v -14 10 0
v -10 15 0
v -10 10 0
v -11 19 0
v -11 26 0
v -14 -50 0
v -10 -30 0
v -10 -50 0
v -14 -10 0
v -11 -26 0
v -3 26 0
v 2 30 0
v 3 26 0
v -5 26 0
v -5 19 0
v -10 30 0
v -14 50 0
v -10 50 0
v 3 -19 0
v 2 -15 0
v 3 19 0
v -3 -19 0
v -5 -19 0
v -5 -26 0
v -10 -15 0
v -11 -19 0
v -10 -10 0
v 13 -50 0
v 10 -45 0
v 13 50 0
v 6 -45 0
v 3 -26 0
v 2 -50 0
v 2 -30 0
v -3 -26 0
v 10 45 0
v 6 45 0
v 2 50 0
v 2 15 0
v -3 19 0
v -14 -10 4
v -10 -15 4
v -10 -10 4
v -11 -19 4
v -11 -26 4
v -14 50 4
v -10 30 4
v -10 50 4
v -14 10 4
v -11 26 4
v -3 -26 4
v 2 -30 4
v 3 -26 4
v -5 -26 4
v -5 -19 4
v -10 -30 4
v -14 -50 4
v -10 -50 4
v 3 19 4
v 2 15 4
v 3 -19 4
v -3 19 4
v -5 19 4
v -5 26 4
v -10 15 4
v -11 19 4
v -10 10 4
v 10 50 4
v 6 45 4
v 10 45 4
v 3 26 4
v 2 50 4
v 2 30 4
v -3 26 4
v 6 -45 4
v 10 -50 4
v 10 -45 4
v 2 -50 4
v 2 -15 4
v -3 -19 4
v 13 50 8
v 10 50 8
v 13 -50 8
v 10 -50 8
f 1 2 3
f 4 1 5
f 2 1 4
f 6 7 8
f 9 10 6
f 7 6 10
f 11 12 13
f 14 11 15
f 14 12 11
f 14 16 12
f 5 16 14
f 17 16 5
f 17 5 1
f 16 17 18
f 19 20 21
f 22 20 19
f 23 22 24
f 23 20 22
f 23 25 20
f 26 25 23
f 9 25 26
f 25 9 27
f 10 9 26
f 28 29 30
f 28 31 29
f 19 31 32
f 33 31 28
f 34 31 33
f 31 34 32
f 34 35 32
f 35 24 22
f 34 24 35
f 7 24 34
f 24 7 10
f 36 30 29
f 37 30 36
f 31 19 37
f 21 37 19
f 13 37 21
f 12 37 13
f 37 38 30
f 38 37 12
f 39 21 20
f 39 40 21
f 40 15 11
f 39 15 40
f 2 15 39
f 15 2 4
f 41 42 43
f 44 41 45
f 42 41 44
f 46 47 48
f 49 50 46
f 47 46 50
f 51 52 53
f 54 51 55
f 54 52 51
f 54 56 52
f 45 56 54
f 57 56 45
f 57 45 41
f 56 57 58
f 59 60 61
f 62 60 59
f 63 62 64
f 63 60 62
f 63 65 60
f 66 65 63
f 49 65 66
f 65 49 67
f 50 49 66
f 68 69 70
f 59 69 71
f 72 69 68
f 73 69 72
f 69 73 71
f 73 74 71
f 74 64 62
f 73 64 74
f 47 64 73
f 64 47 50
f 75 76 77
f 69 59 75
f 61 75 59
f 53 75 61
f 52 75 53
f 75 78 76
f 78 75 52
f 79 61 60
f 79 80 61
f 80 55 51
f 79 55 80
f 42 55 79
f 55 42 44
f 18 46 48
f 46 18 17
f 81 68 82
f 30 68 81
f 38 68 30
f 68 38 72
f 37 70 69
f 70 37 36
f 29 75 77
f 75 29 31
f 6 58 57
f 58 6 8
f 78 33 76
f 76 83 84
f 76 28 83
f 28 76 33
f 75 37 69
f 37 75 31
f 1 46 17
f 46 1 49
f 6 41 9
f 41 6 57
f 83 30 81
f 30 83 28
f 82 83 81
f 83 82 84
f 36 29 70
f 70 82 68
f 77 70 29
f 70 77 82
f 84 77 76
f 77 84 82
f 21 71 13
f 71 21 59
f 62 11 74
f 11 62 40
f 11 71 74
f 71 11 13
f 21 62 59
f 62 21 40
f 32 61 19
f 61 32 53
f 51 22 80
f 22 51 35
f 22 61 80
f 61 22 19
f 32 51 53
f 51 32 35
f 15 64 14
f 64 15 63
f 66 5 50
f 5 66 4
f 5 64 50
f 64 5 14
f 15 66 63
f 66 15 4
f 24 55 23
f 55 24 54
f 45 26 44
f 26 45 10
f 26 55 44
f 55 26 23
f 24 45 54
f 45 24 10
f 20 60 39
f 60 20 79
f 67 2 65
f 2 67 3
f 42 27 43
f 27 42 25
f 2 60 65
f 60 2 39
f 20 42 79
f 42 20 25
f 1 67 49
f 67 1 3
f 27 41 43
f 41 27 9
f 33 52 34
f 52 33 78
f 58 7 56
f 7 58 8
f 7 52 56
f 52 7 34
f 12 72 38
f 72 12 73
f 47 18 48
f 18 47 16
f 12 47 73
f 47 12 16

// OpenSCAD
difference()
{
    union()
    {
        translate([-14, -50, 0])
            cube(size=[20,100,4], center=false);

        translate([10, -50, 0])
            cube(size=[3,100,8], center=false);
            
        rotate(a=90, v=[0,1,0]) 
        {
            /*Device handler*/
            translate([0,25,10])
                translate([-4,20,-10])
                    cube(size=[4,5,12], center=false);

            translate([0,-25,10])
                translate([-4,-25,-10])
                    cube(size=[4,5,12], center=false);
        }
    }

    rotate(a=90, v=[0,1,0])
    {
        /*Device handler holes*/
        translate([0,0,2])
            translate([-50,20-1,-4-1])
                cube(size=[100,5+2,4+2], center=false);

        translate([0,0,2])
            translate([-50,-25-1,-4-1])
                cube(size=[100,5+2,4+2], center=false);


        translate([0,0,2-2-4-2])
            translate([-50,20-1,-4-1])
                cube(size=[100,5+2,4+2], center=false);

        translate([0,0,2-2-4-2])
            translate([-50,-25-1,-4-1])
                cube(size=[100,5+2,4+2], center=false);

        /*central hole*/
        translate([0,0,2-2-4-2])
            translate([-40,-15,-4])
                cube(size=[100,30,12], center=false);

        /*central cut hole*/
        translate([0,0,2-2-4-2])
            translate([-40,-10,-4-5])
                cube(size=[100,20,12], center=false);

        /*side hole*/
        translate([0,0,2-2-4-2])
            translate([-40,-60,-4])
                cube(size=[100,30,12], center=false);

        /*side hole*/
        translate([0,0,2-2-4-2])
            translate([-40,30,-4])
                cube(size=[100,30,12], center=false);
    }
}
